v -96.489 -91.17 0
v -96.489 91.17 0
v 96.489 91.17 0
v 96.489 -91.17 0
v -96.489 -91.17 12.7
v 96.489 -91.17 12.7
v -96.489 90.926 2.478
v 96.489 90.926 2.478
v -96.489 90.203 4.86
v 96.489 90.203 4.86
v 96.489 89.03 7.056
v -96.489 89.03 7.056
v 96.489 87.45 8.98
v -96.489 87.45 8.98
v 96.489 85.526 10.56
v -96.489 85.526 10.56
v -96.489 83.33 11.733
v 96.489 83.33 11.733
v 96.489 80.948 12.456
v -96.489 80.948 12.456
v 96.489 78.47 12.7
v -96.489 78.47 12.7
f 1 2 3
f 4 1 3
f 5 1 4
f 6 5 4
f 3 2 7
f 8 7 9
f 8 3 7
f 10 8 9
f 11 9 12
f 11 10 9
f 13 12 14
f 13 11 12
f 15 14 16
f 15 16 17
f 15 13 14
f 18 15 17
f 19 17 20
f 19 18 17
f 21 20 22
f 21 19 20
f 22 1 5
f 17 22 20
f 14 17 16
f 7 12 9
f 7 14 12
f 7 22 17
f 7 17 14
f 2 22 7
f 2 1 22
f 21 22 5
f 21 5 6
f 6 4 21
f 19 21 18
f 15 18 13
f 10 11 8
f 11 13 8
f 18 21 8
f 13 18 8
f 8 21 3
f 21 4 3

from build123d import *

# Parameters (mm, degrees)
F0_W     = 192.9788589478
F0_H     = 182.3403686285
F1_DEPTH = 12.7
F4_R     = 12.69999


# Not quite as in the source:
# - a fillet or chamfer is up to 0.001 mm smaller than in the source, because OpenCascade refuses the exact size
# - the program builds the solid bodies; features that only make, move or delete a surface that nothing else refers to are left out


with BuildPart() as f1:
    # F0 (on Top) → F1 (new body)
    with BuildSketch(Plane.XY):
        Rectangle(F0_W, F0_H)
    extrude(amount=F1_DEPTH)

    # F4 (radius 12.7 in the source; OpenCascade refuses exactly that, so slightly less here)
    f4_edges = [f1.edges().sort_by_distance(p)[0] for p in [
        (0, 91.170184, 12.7),
    ]]
    fillet(f4_edges, radius=F4_R)


solid = f1.part
